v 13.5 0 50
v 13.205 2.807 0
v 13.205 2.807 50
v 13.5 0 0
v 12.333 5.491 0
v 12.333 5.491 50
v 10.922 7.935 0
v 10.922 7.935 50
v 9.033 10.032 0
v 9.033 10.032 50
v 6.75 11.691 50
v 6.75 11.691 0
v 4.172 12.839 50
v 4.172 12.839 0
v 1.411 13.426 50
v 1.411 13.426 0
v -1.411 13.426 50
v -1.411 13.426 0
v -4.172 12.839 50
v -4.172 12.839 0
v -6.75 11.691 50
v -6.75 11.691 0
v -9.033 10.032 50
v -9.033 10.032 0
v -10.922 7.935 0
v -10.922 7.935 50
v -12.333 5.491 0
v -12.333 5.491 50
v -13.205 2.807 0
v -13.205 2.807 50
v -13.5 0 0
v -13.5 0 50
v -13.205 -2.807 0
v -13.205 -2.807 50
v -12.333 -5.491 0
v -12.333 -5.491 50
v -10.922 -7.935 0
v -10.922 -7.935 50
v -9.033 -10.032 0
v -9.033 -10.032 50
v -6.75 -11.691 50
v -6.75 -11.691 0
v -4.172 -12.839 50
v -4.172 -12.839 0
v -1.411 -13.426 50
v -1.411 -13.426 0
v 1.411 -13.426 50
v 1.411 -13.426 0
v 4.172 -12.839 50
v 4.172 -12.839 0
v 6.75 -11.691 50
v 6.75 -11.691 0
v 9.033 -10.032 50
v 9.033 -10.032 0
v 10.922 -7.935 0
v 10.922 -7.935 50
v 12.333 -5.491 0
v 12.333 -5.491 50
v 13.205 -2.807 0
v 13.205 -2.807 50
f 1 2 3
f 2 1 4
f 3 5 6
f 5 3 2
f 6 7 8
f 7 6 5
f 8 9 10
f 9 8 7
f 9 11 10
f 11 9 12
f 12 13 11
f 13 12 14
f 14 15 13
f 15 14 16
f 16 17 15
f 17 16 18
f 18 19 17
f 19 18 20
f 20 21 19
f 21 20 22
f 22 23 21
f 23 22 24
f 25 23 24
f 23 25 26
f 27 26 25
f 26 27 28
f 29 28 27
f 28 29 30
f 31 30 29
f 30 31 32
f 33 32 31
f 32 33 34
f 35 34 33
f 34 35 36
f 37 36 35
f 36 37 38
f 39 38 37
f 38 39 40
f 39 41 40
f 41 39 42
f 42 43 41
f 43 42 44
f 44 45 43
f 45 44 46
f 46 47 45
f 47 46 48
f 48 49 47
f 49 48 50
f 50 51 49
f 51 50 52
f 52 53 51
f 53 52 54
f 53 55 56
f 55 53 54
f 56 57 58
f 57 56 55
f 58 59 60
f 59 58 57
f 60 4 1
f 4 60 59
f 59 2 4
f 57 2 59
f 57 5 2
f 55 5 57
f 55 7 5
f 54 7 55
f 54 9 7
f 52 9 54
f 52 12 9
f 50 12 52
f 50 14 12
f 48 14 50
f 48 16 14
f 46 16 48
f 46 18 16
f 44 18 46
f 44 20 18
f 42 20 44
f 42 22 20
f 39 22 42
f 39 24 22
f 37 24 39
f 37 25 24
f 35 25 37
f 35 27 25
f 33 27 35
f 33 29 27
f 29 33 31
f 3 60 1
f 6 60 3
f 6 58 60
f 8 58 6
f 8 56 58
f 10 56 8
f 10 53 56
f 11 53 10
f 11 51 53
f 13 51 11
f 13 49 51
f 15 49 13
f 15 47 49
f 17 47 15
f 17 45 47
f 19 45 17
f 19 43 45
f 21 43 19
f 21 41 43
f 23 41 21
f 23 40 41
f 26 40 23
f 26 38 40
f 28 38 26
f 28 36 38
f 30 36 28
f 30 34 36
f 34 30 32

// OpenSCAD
BATTERY_DIAMETER = 21;

cylinder(r=(BATTERY_DIAMETER/2)+3,h=50);

module battery(){
  BATTERY_DIAMETER = 22;
  BATTERY_LENGTH = 102;
  USB_OFFSET = 5;
  USB_LENGTH = 12;
  USB_WIDTH = 5;

  difference(){
    union(){
      cylinder(r=BATTERY_DIAMETER/2, h=BATTERY_LENGTH);
      
      // clip
      translate([-9.5/2,-(BATTERY_DIAMETER/2)-1,0]){
        cube([9.5,BATTERY_DIAMETER/2,39]);
      }
    }
    // USB input
    translate([-USB_LENGTH/2, (BATTERY_DIAMETER/2)-USB_OFFSET-USB_WIDTH,-1]){
      cube([USB_LENGTH,USB_WIDTH,10]);
    }
  }
}
